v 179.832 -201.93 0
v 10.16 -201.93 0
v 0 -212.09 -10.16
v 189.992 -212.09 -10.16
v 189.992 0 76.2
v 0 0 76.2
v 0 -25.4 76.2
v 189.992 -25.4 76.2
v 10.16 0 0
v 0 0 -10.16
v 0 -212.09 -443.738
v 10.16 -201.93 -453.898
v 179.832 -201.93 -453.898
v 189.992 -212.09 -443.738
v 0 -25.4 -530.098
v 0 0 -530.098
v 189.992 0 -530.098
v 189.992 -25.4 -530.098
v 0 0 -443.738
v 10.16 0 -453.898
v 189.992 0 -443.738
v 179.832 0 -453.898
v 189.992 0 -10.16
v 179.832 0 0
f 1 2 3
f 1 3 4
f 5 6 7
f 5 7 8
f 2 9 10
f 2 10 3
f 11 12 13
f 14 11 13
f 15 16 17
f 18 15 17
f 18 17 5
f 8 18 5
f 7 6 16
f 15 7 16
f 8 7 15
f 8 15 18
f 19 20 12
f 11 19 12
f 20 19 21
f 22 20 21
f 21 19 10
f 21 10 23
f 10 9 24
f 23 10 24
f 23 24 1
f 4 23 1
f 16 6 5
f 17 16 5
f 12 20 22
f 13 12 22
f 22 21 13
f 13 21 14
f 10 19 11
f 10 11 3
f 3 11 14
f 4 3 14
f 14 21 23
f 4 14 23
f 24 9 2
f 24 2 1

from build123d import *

# Parameters (mm, degrees)
F0_W     = 189.992
F0_H     = 453.898
F1_DEPTH = 212.09
F2_SIZE  = 10.16
F3_SIZE  = 10.16
F0_H_2   = 76.2
F4_DEPTH = 25.4


with BuildPart() as f1:
    # F0 (on Front) → F1 (new body)
    with BuildSketch(Plane.XZ):
        with Locations((94.996, -226.949)):
            Rectangle(F0_W, F0_H)
    extrude(amount=F1_DEPTH)

    # F2
    f2_edges = [f1.edges().sort_by_distance(p)[0] for p in [
        (0, -106.045, 0),
        (189.992, -106.045, 0),
        (189.992, -106.045, -453.898),
        (0, -106.045, -453.898),
    ]]
    chamfer(f2_edges, length=F2_SIZE)

    # F3
    f3_edges = [f1.edges().sort_by_distance(p)[0] for p in [
        (94.996, -212.09, 0),
        (94.996, -212.09, -453.898),
    ]]
    chamfer(f3_edges, length=F3_SIZE)


with BuildPart() as f4:
    # F0 (on Front) → F4 (new body)
    with BuildSketch(Plane.XZ):
        with Locations((94.996, 38.1)):
            Rectangle(F0_W, F0_H_2)
        with Locations((94.996, -491.998)):
            Rectangle(F0_W, F0_H_2)
        with Locations((94.996, -226.949)):
            Rectangle(F0_W, F0_H)
    extrude(amount=F4_DEPTH)


solid = Compound([f1.part, f4.part])
